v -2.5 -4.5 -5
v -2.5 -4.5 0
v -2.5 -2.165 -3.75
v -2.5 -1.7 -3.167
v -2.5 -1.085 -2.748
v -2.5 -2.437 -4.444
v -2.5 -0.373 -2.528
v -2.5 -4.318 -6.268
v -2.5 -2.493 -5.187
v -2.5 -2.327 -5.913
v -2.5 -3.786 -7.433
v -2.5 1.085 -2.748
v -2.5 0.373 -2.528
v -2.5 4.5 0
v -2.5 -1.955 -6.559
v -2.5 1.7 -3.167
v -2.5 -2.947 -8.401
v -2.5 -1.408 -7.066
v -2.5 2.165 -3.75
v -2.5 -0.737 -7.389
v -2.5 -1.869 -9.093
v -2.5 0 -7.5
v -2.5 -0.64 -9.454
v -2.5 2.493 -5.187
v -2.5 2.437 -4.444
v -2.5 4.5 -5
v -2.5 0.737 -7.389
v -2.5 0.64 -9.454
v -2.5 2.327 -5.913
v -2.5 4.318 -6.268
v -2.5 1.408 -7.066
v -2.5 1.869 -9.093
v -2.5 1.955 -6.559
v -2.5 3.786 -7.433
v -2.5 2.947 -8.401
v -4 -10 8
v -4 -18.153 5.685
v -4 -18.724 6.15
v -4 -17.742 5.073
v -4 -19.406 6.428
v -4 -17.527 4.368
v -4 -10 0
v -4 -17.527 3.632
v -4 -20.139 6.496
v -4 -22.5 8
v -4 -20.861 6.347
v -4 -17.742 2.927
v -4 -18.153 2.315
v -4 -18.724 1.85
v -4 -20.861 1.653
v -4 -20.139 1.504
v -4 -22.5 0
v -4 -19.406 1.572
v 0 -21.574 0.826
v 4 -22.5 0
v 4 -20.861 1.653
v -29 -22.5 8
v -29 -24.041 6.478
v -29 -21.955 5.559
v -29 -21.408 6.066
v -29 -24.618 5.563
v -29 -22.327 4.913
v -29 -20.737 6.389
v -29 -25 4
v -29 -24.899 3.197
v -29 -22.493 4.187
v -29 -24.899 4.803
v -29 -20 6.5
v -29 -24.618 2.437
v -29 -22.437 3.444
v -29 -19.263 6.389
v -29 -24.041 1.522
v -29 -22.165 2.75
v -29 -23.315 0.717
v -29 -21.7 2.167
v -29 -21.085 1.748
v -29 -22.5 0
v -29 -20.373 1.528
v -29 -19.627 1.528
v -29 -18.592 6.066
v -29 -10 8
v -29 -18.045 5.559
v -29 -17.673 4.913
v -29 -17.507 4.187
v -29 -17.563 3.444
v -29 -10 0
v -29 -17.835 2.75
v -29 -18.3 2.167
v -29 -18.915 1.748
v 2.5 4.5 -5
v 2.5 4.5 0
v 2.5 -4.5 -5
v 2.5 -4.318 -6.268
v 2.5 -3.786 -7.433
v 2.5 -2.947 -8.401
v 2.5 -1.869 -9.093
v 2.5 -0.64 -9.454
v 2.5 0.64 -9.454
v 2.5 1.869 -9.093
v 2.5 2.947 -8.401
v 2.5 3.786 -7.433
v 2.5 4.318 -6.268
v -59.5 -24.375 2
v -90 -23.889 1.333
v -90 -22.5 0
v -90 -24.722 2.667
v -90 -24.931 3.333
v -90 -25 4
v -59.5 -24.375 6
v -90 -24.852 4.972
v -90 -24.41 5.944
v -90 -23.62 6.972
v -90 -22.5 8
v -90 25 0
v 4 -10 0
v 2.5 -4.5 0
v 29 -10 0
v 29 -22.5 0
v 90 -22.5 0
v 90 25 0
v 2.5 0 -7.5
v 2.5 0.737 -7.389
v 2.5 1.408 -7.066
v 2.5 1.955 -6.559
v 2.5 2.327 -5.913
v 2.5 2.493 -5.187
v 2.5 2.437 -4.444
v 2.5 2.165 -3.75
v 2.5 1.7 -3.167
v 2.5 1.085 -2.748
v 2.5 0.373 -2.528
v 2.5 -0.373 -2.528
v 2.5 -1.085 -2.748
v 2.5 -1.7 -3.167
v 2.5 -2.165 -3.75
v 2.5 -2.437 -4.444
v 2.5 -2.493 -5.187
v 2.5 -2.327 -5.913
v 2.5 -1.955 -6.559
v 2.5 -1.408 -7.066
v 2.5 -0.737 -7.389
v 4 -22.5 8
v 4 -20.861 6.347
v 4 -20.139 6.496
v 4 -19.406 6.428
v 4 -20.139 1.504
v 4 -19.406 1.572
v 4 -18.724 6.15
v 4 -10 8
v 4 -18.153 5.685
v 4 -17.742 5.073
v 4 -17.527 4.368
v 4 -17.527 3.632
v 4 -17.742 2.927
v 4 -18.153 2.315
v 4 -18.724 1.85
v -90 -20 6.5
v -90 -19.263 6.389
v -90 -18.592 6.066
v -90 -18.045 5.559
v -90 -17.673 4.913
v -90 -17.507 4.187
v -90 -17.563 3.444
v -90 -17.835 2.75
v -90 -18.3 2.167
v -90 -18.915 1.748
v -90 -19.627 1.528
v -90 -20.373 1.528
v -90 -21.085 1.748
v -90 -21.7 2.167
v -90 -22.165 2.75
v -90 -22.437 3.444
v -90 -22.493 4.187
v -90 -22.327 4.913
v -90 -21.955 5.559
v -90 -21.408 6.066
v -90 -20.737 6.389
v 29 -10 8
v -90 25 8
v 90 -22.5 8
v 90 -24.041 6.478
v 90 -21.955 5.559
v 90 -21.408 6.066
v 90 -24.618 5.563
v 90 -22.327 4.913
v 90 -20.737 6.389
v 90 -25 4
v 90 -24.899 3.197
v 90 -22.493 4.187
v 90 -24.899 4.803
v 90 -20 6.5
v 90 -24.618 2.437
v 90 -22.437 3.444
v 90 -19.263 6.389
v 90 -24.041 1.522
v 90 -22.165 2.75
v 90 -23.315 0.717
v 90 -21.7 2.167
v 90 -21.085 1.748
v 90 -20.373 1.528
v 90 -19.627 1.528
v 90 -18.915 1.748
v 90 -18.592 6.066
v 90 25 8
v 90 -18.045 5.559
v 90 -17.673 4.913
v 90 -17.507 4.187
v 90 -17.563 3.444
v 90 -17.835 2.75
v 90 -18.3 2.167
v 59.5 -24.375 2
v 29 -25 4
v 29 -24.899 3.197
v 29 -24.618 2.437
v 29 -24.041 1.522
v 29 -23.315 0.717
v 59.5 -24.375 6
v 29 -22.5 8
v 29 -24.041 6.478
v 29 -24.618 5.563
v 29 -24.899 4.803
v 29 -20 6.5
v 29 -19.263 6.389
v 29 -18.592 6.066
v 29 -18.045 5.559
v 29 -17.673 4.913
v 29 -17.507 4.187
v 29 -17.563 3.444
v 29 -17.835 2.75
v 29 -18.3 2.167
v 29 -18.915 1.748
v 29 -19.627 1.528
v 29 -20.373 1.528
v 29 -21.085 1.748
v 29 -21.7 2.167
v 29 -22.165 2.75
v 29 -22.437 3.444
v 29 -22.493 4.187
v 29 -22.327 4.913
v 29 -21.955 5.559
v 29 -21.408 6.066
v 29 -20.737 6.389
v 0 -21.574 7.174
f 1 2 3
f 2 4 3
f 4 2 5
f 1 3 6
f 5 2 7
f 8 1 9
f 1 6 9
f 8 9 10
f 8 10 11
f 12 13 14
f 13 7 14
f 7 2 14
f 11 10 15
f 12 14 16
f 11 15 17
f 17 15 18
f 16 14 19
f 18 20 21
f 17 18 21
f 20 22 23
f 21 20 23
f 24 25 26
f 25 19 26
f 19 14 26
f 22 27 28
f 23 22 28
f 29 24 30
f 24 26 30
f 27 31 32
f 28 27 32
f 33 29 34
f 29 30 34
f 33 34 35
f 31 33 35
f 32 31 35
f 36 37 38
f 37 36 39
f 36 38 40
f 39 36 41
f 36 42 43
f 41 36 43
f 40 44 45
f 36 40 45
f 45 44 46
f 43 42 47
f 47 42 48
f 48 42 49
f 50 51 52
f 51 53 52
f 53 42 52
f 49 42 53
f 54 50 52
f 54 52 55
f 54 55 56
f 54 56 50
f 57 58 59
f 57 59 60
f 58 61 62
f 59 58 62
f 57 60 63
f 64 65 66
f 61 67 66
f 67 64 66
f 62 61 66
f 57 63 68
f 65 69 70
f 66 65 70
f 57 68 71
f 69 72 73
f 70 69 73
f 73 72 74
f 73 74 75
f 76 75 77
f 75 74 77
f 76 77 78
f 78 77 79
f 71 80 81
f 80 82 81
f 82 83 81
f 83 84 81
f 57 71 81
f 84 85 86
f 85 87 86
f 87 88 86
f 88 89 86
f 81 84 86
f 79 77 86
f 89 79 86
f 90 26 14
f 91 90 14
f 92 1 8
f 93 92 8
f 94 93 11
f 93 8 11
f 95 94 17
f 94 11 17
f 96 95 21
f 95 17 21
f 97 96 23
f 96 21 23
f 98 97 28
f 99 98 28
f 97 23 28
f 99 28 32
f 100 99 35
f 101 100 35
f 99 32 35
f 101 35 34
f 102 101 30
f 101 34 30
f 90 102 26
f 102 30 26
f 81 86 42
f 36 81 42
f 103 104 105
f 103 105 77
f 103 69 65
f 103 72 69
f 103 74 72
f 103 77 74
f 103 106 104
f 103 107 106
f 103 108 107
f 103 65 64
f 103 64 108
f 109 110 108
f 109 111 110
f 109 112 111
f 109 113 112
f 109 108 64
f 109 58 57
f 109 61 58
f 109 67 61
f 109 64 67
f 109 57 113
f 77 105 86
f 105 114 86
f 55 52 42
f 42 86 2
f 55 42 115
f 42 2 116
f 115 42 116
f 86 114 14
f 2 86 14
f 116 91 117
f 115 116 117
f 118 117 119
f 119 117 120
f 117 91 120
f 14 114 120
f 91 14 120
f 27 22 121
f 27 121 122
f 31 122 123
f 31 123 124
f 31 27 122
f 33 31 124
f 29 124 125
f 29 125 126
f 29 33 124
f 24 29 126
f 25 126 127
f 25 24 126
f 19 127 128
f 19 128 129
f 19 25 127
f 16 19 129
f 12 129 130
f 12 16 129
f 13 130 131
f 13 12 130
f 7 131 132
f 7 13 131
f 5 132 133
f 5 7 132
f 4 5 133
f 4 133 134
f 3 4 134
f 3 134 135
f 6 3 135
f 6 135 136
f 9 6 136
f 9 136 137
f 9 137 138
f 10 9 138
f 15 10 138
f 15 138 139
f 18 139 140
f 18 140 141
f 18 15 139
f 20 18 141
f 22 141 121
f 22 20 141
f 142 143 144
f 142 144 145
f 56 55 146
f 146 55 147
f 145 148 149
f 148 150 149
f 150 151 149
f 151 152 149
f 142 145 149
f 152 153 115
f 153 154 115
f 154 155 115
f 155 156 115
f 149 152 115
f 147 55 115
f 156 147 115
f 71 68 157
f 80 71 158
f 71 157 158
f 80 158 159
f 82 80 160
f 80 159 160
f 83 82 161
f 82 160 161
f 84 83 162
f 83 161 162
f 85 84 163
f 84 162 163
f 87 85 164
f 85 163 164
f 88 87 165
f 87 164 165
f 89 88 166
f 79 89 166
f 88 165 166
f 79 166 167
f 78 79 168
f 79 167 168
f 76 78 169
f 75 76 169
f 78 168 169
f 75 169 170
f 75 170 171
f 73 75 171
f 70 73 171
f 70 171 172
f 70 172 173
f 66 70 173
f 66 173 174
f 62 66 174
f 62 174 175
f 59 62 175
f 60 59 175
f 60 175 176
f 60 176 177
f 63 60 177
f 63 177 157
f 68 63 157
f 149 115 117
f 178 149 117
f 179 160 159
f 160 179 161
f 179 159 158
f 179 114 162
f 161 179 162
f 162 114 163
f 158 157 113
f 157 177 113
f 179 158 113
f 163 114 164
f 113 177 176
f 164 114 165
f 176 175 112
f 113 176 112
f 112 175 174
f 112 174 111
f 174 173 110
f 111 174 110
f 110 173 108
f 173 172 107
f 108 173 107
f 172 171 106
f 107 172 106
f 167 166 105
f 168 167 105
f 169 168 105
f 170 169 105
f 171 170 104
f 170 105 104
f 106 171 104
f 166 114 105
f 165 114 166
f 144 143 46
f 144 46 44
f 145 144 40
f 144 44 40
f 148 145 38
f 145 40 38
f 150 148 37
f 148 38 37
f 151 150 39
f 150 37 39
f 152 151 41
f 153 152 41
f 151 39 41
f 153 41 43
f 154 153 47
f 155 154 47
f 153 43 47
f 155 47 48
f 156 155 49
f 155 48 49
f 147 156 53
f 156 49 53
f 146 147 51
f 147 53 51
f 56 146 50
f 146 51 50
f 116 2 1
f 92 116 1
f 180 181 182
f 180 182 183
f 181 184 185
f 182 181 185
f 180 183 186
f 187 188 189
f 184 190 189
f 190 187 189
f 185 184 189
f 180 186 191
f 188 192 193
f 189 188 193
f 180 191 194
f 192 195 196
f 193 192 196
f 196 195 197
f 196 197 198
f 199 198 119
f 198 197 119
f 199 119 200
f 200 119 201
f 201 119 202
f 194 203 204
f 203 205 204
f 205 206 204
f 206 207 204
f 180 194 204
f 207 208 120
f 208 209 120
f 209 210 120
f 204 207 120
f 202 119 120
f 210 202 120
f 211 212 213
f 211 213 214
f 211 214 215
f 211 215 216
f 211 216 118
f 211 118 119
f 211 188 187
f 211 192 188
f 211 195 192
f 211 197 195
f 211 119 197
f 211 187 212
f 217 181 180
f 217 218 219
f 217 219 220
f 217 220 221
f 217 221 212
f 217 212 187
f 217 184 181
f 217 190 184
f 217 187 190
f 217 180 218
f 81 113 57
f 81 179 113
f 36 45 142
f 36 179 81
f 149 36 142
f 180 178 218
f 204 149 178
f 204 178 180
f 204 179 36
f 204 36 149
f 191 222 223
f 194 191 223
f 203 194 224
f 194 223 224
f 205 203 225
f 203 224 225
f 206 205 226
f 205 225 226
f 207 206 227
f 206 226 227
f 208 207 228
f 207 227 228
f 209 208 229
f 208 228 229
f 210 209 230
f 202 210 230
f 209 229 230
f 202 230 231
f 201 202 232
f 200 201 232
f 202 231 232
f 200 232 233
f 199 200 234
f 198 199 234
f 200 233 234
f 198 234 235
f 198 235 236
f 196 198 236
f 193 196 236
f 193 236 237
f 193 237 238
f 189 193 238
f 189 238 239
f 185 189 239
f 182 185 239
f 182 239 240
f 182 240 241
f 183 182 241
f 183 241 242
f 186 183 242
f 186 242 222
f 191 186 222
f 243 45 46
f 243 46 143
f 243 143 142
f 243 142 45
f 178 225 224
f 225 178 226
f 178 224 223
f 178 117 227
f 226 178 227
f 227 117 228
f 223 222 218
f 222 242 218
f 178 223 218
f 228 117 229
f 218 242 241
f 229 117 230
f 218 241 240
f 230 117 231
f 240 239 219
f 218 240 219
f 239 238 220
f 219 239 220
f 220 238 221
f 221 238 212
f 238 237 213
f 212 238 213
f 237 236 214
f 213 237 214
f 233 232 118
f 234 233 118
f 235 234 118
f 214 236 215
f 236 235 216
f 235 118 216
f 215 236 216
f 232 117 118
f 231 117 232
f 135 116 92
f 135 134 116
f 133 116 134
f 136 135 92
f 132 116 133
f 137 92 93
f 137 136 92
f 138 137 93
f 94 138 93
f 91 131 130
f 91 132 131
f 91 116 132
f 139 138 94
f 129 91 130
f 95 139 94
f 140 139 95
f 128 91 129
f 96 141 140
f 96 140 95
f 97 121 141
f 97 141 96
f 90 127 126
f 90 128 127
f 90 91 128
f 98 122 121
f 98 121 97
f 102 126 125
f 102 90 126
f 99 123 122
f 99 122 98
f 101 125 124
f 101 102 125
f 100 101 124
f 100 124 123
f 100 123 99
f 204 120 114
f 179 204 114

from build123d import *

# Parameters (mm, degrees)
BOSS_EXTRU_1_DEPTH      = 8
ENL_V_MAT_EXTRU_1_REACH = 183.904
ESQUISSE2_R             = 2.5
BOSS_EXTRU_2_DEPTH      = 2.5
BOSS_EXTRU_2_DEPTH_BACK = 2.5
ESQUISSE4_R             = 2.5
ENL_V_MAT_EXTRU_2_DEPTH = 8


with BuildPart() as part:
    # Esquisse1 → Boss.-Extru.1 (new body)
    with BuildSketch(Plane.XY):
        Polygon((-29, -25), (-29, -10), (-4, -10), (-4, -25), (4, -25), (4, -10), (29, -10), (29, -25), (90, -25), (90, 25), (-90, 25), (-90, -25), align=None)
    extrude(amount=BOSS_EXTRU_1_DEPTH)

    # Enlèv. mat.-Extru.1: up to this face of the body (flat: up to its plane)
    enl_v_mat_extru_1_end = Plane(part.part.faces().sort_by_distance((90, 0, 4))[0])
    # Esquisse2 → Enlèv. mat.-Extru.1 (cut, up to the picked face)
    with BuildSketch(Plane.ZY.offset(90), mode=Mode.PRIVATE) as enl_v_mat_extru_1_sk1:
        with BuildLine():
            add(Edge.make_bspline(
                [(4, -25), (6, -25), (8, -22.5)],
                knots=[0.5, 0.5, 0.5, 1, 1, 1], degree=2))
            Line((4, -25), (8, -25))
            Line((8, -25), (8, -22.5))
        make_face()
    enl_v_mat_extru_1_tool1 = split(extrude(enl_v_mat_extru_1_sk1.sketch, amount=-ENL_V_MAT_EXTRU_1_REACH, mode=Mode.PRIVATE), bisect_by=enl_v_mat_extru_1_end, keep=Keep.BOTH, mode=Mode.PRIVATE)
    # Esquisse2 → Enlèv. mat.-Extru.1 (cut, up to the picked face)
    with BuildSketch(Plane.ZY.offset(90), mode=Mode.PRIVATE) as enl_v_mat_extru_1_sk2:
        with BuildLine():
            add(Edge.make_bspline(
                [(0, -22.5), (2, -25), (4, -25)],
                knots=[0, 0, 0, 0.5, 0.5, 0.5], degree=2))
            Line((0, -22.5), (0, -25))
            Line((0, -25), (4, -25))
        make_face()
    enl_v_mat_extru_1_tool2 = split(extrude(enl_v_mat_extru_1_sk2.sketch, amount=-ENL_V_MAT_EXTRU_1_REACH, mode=Mode.PRIVATE), bisect_by=enl_v_mat_extru_1_end, keep=Keep.BOTH, mode=Mode.PRIVATE)
    # Esquisse2 → Enlèv. mat.-Extru.1 (cut, up to the picked face)
    with BuildSketch(Plane.ZY.offset(90), mode=Mode.PRIVATE) as enl_v_mat_extru_1_sk3:
        with Locations((4, -20)):
            Circle(ESQUISSE2_R)
    enl_v_mat_extru_1_tool3 = split(extrude(enl_v_mat_extru_1_sk3.sketch, amount=-ENL_V_MAT_EXTRU_1_REACH, mode=Mode.PRIVATE), bisect_by=enl_v_mat_extru_1_end, keep=Keep.BOTH, mode=Mode.PRIVATE)
    add(enl_v_mat_extru_1_tool1.solids().sort_by(Axis((-90, -24.25, 7), (1, 0, 0)))[0], mode=Mode.SUBTRACT)
    add(enl_v_mat_extru_1_tool2.solids().sort_by(Axis((-90, -24.25, 1), (1, 0, 0)))[0], mode=Mode.SUBTRACT)
    add(enl_v_mat_extru_1_tool3.solids().sort_by(Axis((-90, -20, 4), (1, 0, 0)))[0], mode=Mode.SUBTRACT)

    # Esquisse4 → Boss.-Extru.2 (add, two sides: drawn at the far end of the back side and taken through both)
    with BuildSketch(Plane(origin=(0, 0, 0), x_dir=(0, 0, -1), z_dir=(1, 0, 0)).offset(-BOSS_EXTRU_2_DEPTH_BACK)):
        with BuildLine():
            Line((5, 4.5), (0, 4.5))
            Line((0, 4.5), (0, -4.5))
            Line((0, -4.5), (5, -4.5))
            ThreePointArc((5, -4.5), (9.5, 0), (5, 4.5))
        make_face()
        with Locations((5, 0)):
            Circle(ESQUISSE4_R, mode=Mode.SUBTRACT)
    extrude(amount=BOSS_EXTRU_2_DEPTH + BOSS_EXTRU_2_DEPTH_BACK)

    # Esquisse6 → Enlèv. mat.-Extru.2 (cut)
    with BuildSketch(Plane.ZY.offset(4)):
        with BuildLine():
            add(Edge.make_bspline(
                [(0, -22.5), (4, -17.5), (8, -22.5)],
                knots=[0, 0, 0, 1, 1, 1], degree=2))
            add(Edge.make_bspline(
                [(0, -22.5), (4, -27.5), (8, -22.5)],
                knots=[0, 0, 0, 1, 1, 1], degree=2))
        make_face()
    extrude(amount=-ENL_V_MAT_EXTRU_2_DEPTH, mode=Mode.SUBTRACT)


solid = part.part
